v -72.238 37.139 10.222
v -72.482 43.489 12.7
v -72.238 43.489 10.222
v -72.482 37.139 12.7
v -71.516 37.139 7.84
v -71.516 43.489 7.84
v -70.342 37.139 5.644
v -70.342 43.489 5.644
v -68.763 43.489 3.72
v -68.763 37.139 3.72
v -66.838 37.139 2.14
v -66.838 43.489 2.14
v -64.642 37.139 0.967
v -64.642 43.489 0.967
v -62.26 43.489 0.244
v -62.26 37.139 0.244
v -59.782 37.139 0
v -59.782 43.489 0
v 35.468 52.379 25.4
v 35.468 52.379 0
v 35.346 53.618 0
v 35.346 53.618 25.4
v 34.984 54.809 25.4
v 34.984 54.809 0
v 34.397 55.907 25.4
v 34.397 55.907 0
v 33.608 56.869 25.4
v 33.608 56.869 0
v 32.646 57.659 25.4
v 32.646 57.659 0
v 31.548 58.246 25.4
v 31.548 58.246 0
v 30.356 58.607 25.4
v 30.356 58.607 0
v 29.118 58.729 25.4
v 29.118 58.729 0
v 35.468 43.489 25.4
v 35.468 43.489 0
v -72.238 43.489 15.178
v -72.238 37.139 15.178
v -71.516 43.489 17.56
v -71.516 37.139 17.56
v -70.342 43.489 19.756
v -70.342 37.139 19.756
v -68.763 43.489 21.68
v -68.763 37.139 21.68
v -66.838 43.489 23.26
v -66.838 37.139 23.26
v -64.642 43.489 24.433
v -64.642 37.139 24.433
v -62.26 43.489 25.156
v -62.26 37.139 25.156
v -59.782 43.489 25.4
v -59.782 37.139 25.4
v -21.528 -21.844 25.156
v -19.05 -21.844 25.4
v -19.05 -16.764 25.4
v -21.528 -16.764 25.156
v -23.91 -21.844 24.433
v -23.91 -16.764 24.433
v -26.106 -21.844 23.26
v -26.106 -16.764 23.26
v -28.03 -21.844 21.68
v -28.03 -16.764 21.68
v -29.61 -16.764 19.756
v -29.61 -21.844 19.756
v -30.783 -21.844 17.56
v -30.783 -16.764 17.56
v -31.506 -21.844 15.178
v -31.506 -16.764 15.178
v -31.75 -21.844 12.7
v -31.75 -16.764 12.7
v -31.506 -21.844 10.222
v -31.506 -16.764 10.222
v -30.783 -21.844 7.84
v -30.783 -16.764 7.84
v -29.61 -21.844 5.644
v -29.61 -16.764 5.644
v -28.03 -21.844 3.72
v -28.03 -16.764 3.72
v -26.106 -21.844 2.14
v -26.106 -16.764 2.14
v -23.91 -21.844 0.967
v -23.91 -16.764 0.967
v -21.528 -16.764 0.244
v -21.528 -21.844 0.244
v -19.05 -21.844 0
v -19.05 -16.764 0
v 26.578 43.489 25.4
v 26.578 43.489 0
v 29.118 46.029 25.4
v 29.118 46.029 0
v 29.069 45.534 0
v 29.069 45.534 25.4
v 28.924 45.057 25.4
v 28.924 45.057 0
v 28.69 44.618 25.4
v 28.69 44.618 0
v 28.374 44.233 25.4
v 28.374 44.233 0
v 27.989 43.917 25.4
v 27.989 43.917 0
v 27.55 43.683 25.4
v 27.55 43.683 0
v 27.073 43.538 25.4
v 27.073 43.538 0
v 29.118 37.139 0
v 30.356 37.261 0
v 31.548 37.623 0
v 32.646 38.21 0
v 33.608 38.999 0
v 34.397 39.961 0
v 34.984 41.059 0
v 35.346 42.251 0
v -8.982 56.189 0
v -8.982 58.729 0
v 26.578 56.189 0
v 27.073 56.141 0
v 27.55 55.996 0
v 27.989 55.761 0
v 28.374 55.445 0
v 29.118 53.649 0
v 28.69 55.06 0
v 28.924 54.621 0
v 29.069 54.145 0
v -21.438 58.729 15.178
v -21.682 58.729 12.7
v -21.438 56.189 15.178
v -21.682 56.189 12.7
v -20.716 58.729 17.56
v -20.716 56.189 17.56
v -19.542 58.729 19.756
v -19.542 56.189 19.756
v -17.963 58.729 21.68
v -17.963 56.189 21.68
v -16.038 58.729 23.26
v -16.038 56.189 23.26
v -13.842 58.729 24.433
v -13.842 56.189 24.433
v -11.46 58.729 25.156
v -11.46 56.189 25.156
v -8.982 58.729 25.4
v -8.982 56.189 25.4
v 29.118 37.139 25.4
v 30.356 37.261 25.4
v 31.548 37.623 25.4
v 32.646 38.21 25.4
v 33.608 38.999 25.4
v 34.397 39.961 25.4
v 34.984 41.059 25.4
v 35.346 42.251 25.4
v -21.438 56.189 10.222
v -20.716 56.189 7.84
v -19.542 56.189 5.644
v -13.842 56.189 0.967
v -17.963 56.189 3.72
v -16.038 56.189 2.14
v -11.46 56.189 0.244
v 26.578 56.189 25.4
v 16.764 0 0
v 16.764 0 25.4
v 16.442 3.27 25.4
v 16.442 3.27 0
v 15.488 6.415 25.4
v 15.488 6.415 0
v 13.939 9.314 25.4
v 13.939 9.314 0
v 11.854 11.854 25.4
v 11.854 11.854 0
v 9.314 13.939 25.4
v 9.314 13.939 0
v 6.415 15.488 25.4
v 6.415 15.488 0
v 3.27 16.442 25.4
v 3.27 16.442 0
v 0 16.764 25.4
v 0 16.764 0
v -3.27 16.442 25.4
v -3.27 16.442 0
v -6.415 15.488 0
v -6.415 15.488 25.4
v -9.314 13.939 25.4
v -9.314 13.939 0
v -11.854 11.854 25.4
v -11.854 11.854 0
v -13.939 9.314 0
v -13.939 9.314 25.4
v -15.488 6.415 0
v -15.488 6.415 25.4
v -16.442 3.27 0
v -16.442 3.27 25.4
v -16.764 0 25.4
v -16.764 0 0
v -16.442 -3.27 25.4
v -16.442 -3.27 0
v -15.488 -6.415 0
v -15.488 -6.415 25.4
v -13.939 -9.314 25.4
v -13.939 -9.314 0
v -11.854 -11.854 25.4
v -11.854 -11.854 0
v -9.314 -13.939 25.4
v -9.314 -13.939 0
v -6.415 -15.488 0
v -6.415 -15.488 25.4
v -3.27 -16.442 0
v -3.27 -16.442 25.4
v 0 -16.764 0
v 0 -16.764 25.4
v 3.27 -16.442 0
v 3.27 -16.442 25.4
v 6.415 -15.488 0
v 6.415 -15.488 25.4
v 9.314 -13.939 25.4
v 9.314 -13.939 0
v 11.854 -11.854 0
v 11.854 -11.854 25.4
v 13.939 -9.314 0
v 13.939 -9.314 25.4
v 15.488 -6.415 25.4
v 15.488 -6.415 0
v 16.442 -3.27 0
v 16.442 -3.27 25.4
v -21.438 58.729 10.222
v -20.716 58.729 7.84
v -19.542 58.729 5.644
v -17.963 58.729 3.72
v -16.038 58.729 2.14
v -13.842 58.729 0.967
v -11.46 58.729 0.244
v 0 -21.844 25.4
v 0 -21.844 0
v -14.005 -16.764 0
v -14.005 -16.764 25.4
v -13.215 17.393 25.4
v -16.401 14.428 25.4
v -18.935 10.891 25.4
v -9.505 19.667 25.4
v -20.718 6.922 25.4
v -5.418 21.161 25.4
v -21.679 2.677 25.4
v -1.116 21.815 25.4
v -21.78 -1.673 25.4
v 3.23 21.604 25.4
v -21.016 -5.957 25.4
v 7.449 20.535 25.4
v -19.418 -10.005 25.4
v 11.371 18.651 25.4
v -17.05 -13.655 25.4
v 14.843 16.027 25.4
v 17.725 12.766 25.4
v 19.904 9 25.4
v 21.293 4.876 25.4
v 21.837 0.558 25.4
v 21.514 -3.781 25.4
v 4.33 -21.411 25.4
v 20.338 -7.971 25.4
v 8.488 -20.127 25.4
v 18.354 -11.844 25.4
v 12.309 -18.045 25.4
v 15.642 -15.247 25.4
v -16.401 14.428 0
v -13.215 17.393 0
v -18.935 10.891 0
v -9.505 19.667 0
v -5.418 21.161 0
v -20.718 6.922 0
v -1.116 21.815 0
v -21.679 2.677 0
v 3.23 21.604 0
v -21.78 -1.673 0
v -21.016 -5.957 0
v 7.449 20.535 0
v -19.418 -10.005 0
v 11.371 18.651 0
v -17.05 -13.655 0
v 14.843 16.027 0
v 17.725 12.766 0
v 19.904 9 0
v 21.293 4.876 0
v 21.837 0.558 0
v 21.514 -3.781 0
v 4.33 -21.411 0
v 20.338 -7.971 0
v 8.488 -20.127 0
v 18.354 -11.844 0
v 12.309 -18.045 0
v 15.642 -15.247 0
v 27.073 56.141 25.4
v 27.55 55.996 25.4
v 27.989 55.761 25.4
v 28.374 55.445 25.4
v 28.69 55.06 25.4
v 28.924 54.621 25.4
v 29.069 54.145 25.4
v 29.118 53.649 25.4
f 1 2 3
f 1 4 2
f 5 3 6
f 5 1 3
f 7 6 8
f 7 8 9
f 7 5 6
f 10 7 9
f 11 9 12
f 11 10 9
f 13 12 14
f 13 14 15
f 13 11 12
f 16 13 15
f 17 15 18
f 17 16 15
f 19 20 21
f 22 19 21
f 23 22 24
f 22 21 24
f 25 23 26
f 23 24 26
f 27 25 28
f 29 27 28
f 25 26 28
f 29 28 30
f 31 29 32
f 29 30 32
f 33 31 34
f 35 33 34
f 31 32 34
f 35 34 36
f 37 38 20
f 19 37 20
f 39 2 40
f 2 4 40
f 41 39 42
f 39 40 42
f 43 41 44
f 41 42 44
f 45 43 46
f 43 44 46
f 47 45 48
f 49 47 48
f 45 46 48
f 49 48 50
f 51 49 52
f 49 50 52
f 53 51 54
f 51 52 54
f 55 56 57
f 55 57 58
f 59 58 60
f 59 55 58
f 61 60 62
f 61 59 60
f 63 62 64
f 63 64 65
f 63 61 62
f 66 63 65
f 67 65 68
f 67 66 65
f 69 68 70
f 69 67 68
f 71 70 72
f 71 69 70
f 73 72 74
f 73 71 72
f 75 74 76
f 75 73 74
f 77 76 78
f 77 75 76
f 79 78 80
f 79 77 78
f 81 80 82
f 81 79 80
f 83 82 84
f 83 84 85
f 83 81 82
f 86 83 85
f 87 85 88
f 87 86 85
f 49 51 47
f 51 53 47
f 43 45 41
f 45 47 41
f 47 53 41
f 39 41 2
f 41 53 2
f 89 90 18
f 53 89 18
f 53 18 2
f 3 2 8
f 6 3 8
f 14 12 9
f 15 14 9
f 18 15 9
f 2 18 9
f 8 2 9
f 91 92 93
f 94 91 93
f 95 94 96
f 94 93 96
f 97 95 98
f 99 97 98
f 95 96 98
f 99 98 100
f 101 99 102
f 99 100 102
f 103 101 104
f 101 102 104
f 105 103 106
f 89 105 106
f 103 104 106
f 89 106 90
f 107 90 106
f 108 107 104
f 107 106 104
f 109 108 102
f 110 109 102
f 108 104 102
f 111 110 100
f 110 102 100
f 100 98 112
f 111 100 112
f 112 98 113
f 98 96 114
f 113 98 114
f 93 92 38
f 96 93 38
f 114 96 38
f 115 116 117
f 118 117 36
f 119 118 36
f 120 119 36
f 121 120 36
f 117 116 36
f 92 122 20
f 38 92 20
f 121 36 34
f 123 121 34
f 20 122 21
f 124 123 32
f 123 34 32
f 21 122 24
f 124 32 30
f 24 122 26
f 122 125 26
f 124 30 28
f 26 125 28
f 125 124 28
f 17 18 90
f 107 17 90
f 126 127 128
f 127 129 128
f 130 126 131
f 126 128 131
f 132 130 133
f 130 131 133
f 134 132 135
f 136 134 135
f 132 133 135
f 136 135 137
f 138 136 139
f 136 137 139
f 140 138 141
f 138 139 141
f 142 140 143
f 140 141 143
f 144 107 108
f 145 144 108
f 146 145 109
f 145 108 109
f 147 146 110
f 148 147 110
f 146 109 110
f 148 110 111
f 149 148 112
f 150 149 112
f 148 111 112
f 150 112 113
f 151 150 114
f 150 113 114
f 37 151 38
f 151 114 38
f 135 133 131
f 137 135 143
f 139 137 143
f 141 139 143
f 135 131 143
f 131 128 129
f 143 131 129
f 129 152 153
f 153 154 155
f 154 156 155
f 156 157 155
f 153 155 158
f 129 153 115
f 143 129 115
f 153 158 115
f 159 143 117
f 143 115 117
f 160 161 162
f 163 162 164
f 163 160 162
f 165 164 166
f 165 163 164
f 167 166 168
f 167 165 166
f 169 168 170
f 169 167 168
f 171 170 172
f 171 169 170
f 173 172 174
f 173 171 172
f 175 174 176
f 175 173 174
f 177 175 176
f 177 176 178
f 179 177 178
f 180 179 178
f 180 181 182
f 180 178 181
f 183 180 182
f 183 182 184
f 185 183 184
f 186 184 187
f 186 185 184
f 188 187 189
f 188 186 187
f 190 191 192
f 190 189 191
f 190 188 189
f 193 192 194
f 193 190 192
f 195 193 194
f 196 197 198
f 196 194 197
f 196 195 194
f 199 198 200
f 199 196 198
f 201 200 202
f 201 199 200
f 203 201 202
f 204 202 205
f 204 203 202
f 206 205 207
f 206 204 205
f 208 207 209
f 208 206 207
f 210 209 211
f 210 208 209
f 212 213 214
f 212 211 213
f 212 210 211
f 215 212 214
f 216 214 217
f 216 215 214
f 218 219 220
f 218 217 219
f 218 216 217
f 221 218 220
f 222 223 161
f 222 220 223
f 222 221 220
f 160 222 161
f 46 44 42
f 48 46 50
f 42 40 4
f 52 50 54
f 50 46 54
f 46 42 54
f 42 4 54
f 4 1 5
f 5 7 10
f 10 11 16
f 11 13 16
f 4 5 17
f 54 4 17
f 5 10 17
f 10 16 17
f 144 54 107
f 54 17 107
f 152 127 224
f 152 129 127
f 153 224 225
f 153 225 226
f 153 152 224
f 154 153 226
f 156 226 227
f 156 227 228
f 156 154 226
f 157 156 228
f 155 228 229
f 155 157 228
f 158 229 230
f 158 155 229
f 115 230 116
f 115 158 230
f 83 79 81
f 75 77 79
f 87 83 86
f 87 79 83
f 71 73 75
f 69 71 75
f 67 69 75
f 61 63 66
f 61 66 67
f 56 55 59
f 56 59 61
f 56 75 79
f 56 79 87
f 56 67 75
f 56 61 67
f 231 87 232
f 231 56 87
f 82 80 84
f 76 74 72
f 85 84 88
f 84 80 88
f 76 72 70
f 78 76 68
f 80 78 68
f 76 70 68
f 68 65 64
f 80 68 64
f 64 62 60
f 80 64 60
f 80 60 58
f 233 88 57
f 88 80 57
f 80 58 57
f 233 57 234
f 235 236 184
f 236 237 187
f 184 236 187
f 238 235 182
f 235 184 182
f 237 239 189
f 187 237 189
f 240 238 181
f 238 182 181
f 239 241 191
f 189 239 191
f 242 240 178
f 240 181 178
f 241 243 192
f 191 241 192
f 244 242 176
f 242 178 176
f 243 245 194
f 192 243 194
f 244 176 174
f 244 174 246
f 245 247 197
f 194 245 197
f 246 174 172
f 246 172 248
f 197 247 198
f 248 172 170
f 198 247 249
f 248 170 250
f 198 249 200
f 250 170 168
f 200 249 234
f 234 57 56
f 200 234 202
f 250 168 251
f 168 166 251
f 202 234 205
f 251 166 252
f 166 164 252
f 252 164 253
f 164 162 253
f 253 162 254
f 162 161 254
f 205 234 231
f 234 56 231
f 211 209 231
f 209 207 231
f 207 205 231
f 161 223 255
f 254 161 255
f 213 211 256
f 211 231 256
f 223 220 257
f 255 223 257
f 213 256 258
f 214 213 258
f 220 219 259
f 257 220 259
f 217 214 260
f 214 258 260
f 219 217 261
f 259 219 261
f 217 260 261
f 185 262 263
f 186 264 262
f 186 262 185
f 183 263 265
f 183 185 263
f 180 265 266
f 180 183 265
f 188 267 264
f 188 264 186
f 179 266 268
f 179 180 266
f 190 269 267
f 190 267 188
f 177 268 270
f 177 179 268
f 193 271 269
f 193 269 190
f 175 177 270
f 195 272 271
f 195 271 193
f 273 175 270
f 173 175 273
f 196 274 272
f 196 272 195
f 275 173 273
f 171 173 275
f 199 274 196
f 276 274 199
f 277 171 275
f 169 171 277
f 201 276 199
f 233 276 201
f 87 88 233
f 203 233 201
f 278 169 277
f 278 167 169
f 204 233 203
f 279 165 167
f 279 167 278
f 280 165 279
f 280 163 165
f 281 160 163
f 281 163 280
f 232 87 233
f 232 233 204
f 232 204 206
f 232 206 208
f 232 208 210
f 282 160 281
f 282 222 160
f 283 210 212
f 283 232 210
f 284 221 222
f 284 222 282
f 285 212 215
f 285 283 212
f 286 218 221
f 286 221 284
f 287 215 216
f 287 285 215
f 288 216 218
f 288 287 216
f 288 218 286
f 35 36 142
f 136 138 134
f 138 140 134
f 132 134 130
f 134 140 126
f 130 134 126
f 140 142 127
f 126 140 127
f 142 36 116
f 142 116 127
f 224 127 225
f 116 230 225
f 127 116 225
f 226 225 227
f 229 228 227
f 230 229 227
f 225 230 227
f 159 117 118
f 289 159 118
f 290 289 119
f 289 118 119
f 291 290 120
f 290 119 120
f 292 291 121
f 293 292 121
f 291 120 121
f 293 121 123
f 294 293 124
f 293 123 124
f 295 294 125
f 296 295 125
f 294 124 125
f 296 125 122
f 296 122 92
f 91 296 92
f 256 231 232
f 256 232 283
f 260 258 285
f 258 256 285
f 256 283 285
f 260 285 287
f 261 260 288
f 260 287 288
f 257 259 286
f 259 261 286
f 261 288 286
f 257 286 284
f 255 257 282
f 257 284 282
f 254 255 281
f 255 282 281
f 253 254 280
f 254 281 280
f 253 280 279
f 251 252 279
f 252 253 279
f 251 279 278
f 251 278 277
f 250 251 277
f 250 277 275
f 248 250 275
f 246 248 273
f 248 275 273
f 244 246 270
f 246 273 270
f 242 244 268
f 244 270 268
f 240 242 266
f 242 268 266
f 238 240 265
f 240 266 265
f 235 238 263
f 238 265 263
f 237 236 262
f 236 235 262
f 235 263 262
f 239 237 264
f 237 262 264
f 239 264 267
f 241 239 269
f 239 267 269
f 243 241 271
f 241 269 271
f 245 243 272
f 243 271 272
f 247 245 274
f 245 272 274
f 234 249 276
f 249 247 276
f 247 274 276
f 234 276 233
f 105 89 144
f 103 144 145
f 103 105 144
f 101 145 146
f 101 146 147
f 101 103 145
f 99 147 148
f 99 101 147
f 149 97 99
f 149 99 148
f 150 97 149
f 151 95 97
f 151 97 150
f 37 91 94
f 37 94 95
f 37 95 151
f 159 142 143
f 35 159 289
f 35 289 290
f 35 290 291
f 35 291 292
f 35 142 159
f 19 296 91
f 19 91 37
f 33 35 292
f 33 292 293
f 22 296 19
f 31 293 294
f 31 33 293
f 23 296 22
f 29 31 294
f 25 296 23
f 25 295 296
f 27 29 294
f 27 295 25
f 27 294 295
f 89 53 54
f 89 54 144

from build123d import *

# Parameters (mm, degrees)
F0_R     = 21.844
F0_R_2   = 16.764
F1_DEPTH = 25.4
F3_W     = 19.05
F3_H     = 25.4
F4_DEPTH = 5.08
F6_DEPTH = 25.4
F7_R     = 12.69999


# Not quite as in the source:
# - a fillet or chamfer is up to 0.001 mm smaller than in the source, because OpenCascade refuses the exact size


with BuildPart() as f1:
    # F0 (on Top) → F1 (new body)
    with BuildSketch(Plane.XY):
        Circle(F0_R)
        Circle(F0_R_2, mode=Mode.SUBTRACT)
    extrude(amount=F1_DEPTH)

    # F3 (on offset) → F4 (join)
    with BuildSketch(Plane.XZ.offset(21.844)):
        with Locations((-9.525, 12.7)):
            Rectangle(F3_W, F3_H)
        with BuildLine():
            ThreePointArc((-19.05, 25.4), (-31.75, 12.7), (-19.05, 0))
            Line((-19.05, 0), (-19.05, 25.4))
        make_face()
    extrude(amount=-F4_DEPTH)


with BuildPart() as f6:
    # F5 (on Top) → F6 (new body)
    with BuildSketch(Plane.XY):
        with BuildLine():
            ThreePointArc((29.1176303876, 46.0293454591), (28.3736816118, 44.2332942349), (26.5776303876, 43.4893454591))
            Line((26.5776303876, 43.4893454591), (-72.4823696124, 43.4893454591))
            Line((-72.4823696124, 43.4893454591), (-72.4823696124, 37.1393454591))
            Line((-72.4823696124, 37.1393454591), (29.1176303876, 37.1393454591))
            ThreePointArc((29.1176303876, 37.1393454591), (33.6077584481, 38.9992173986), (35.4676303876, 43.4893454591))
            Line((35.4676303876, 43.4893454591), (35.4676303876, 52.3793454591))
            ThreePointArc((35.4676303876, 52.3793454591), (33.6077584481, 56.8694735197), (29.1176303876, 58.7293454591))
            Line((29.1176303876, 58.7293454591), (-21.6823696124, 58.7293454591))
            Line((-21.6823696124, 58.7293454591), (-21.6823696124, 56.1893454591))
            Line((-21.6823696124, 56.1893454591), (26.5776303876, 56.1893454591))
            ThreePointArc((26.5776303876, 56.1893454591), (28.3736816118, 55.4453966833), (29.1176303876, 53.6493454591))
            Line((29.1176303876, 53.6493454591), (29.1176303876, 46.0293454591))
        make_face()
    extrude(amount=F6_DEPTH)

    # F7 (radius 12.7 in the source; OpenCascade refuses exactly that, so slightly less here)
    f7_edges = [f6.edges().sort_by_distance(p)[0] for p in [
        (-72.48237, 40.314345, 25.4),
        (-72.48237, 40.314345, 0),
        (-21.68237, 57.459345, 25.4),
        (-21.68237, 57.459345, 0),
    ]]
    fillet(f7_edges, radius=F7_R)


solid = Compound([f1.part, f6.part])
